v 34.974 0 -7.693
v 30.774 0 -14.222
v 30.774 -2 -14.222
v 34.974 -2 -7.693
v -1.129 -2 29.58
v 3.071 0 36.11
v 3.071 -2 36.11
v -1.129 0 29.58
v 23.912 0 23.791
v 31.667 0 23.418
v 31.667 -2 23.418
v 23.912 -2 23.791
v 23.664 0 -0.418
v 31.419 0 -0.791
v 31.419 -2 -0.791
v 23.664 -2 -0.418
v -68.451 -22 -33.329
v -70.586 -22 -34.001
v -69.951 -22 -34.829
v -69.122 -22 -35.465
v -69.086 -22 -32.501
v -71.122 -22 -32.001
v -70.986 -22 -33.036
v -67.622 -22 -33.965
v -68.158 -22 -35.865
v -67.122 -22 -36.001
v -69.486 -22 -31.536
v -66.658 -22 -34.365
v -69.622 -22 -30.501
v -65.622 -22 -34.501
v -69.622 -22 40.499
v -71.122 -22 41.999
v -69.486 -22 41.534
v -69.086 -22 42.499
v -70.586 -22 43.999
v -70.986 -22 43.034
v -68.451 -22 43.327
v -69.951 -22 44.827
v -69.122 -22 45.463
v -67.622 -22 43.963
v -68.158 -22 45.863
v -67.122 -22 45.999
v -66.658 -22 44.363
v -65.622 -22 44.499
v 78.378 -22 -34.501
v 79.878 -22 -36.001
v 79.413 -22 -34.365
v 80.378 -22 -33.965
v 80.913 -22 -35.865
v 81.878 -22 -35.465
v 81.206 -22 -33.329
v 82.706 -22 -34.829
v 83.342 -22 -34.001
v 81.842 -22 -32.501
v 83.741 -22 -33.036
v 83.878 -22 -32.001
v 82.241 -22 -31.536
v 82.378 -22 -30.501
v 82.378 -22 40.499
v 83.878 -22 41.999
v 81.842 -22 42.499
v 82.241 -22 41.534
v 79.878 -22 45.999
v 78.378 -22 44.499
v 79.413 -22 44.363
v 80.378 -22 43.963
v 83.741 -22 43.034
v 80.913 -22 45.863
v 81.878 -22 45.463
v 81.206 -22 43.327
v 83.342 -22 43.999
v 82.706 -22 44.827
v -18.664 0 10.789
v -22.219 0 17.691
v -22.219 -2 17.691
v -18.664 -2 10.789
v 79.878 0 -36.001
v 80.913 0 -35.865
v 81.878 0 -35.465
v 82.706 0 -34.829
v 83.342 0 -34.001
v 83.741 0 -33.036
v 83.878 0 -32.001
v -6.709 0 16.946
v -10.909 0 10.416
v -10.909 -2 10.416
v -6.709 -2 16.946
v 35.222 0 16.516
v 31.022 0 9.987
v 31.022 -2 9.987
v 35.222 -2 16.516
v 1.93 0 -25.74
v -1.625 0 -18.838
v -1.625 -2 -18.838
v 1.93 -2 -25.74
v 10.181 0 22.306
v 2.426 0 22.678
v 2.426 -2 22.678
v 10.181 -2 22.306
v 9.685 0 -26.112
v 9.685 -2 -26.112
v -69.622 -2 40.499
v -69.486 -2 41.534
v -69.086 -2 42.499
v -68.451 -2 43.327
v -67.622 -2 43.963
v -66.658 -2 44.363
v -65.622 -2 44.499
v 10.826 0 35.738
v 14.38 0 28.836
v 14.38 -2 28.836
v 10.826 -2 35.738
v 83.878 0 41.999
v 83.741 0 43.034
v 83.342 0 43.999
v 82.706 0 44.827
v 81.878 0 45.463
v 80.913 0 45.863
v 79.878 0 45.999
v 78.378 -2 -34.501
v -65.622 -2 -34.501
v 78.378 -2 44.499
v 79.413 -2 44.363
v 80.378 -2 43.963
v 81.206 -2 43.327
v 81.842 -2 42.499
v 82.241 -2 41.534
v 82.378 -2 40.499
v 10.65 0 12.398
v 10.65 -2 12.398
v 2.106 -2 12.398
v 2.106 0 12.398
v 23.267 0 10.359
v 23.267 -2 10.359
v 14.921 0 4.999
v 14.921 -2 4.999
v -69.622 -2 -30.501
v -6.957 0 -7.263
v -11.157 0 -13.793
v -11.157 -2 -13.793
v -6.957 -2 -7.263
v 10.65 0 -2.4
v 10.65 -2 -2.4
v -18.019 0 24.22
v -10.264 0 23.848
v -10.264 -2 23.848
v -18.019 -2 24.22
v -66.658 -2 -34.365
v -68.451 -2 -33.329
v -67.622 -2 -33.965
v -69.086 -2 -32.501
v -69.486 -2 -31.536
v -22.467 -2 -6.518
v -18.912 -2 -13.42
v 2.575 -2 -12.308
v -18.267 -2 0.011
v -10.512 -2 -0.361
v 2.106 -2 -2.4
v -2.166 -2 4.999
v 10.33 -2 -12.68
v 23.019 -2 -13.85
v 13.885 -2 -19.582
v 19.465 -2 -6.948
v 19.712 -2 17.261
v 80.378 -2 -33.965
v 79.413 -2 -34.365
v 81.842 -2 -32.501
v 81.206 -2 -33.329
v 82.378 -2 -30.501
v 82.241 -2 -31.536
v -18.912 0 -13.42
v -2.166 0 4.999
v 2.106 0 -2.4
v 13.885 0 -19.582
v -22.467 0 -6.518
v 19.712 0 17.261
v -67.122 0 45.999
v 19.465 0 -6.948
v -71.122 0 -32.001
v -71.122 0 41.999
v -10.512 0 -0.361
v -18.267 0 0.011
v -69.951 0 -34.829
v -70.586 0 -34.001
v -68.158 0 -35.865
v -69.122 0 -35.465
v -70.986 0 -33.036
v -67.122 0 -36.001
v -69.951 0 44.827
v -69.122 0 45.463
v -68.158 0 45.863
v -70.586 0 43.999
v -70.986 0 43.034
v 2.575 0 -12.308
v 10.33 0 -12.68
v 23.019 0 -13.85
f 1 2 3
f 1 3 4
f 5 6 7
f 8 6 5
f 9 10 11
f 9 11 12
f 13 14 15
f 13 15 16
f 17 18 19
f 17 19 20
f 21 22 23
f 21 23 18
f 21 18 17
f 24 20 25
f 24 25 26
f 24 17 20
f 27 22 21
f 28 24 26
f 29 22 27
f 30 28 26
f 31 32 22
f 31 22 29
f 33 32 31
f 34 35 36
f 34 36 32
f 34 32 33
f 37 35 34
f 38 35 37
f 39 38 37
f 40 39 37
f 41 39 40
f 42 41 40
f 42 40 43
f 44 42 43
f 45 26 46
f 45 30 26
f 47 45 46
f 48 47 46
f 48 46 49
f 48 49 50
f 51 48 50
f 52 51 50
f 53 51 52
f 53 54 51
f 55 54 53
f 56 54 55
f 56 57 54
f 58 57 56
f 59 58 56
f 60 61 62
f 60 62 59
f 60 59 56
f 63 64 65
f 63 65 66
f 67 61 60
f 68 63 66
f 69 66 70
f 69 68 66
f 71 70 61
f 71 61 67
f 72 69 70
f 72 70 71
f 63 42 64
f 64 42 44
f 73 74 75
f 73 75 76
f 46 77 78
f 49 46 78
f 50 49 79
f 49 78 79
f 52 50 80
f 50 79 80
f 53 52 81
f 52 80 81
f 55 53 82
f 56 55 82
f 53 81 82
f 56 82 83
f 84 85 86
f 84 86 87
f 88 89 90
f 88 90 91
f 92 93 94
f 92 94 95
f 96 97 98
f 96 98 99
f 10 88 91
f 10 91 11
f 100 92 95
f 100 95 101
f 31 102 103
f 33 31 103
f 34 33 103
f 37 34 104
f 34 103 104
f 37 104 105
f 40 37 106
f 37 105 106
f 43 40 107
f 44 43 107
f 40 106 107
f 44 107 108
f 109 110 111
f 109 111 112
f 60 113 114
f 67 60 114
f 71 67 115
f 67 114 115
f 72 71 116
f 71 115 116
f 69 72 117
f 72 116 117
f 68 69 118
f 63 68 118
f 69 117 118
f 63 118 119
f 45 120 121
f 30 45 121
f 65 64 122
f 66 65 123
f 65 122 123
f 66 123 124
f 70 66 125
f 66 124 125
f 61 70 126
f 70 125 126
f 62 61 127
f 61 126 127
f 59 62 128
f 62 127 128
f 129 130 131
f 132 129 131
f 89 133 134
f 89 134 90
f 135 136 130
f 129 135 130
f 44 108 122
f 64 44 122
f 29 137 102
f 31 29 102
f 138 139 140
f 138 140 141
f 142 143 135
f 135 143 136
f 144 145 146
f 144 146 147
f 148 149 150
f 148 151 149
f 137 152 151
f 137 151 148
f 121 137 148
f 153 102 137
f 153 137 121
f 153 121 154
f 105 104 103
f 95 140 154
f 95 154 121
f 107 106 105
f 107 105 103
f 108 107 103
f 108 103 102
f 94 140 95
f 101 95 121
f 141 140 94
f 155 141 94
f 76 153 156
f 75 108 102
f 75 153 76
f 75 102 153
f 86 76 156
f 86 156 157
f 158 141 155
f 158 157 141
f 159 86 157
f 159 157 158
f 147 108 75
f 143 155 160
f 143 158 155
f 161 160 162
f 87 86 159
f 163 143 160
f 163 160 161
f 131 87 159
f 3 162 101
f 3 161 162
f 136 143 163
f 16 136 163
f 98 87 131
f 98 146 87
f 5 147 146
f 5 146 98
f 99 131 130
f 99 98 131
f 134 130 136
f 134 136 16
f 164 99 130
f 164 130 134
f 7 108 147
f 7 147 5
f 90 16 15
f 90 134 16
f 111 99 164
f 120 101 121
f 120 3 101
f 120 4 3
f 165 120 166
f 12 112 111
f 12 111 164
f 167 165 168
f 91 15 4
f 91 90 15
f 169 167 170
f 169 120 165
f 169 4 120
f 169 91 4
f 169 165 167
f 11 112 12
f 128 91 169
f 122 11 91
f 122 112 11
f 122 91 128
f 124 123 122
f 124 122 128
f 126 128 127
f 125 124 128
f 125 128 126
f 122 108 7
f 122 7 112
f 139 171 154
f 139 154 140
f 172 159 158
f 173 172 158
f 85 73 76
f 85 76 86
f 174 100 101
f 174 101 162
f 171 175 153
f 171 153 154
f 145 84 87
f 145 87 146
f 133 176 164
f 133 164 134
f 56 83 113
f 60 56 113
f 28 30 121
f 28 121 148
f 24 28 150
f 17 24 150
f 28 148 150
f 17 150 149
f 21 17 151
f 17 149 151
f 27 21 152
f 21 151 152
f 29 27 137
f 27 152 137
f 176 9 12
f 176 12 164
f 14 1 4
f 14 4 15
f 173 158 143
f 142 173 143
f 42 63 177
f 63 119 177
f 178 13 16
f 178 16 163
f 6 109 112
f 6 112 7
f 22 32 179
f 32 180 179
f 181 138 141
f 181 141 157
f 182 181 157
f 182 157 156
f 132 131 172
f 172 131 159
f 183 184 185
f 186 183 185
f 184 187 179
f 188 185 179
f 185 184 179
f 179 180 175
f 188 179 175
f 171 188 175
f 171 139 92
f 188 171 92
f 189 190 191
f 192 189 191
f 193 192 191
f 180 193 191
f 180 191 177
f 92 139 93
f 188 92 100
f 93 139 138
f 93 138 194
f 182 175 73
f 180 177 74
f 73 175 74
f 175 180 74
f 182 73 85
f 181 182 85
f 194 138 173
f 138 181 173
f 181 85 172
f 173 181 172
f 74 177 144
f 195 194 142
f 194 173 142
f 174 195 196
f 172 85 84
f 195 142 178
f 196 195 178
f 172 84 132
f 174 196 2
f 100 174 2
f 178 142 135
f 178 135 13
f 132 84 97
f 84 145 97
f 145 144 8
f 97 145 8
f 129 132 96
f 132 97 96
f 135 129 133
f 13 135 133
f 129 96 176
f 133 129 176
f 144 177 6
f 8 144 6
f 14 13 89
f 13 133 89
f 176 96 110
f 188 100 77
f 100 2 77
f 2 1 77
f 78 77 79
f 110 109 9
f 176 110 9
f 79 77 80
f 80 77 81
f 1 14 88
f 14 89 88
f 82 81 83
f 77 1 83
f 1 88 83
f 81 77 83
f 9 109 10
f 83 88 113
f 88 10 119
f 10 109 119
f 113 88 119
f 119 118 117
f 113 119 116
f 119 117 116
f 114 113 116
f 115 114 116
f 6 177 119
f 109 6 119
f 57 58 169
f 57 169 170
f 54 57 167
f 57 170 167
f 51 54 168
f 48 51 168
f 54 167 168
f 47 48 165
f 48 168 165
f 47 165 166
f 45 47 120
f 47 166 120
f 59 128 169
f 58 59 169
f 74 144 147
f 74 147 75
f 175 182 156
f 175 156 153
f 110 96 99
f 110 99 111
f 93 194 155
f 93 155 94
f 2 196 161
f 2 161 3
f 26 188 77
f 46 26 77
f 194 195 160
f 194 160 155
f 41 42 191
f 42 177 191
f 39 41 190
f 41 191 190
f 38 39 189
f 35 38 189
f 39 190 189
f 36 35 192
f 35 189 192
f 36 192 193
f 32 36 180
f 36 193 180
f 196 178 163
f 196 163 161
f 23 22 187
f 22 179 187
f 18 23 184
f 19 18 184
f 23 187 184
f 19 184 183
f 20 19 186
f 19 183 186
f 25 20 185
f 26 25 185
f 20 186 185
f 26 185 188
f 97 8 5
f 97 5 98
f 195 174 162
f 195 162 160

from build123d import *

# Parameters (mm, degrees)
F1_DEPTH = 2
F3_DEPTH = 20
F5_DEPTH = 12.5


# Not quite as in the source:
# - a feature names something its author has since deleted; it is built from what else it names


with BuildPart() as f1:
    # F0 (on Front) → F1 (new body)
    with BuildSketch(Plane.XZ):
        with BuildLine():
            Line((79.8777135909, 45.9989449601), (-67.1222864091, 45.9989449601))
            ThreePointArc((-67.1222864091, 45.9989449601), (-69.9507135339, 44.8273720848), (-71.1222864091, 41.9989449601))
            Line((-71.1222864091, 41.9989449601), (-71.1222864091, -32.0010550399))
            ThreePointArc((-71.1222864091, -32.0010550399), (-69.9507135339, -34.8294821647), (-67.1222864091, -36.0010550399))
            Line((-67.1222864091, -36.0010550399), (79.8777135909, -36.0010550399))
            ThreePointArc((79.8777135909, -36.0010550399), (82.7061407156, -34.8294821647), (83.8777135909, -32.0010550399))
            Line((83.8777135909, -32.0010550399), (83.8777135909, 41.9989449601))
            ThreePointArc((83.8777135909, 41.9989449601), (82.7061407156, 44.8273720848), (79.8777135909, 45.9989449601))
        make_face()
    extrude(amount=F1_DEPTH)

    # F2 (on face) → F3 (join)
    with BuildSketch(Plane.XZ.offset(2)):
        with BuildLine():
            ThreePointArc((83.8777135909, 41.9989449601), (82.7061407156, 44.8273720848), (79.8777135909, 45.9989449601))
            Line((79.8777135909, 45.9989449601), (-67.1222864091, 45.9989449601))
            ThreePointArc((-67.1222864091, 45.9989449601), (-69.9507135339, 44.8273720848), (-71.1222864091, 41.9989449601))
            Line((-71.1222864091, 41.9989449601), (-71.1222864091, -32.0010550399))
            ThreePointArc((-71.1222864091, -32.0010550399), (-69.9507135339, -34.8294821647), (-67.1222864091, -36.0010550399))
            Line((-67.1222864091, -36.0010550399), (79.8777135909, -36.0010550399))
            ThreePointArc((79.8777135909, -36.0010550399), (82.7061407156, -34.8294821647), (83.8777135909, -32.0010550399))
            Line((83.8777135909, -32.0010550399), (83.8777135909, 41.9989449601))
        make_face()
        with BuildLine():
            ThreePointArc((-69.6222864091, 40.4989449601), (-68.4507135339, 43.3273720848), (-65.6222864091, 44.4989449601))
            Line((-65.6222864091, 44.4989449601), (78.3777135909, 44.4989449601))
            ThreePointArc((78.3777135909, 44.4989449601), (81.2061407156, 43.3273720848), (82.3777135909, 40.4989449601))
            Line((82.3777135909, 40.4989449601), (82.3777135909, -30.5010550399))
            ThreePointArc((82.3777135909, -30.5010550399), (81.2061407156, -33.3294821647), (78.3777135909, -34.5010550399))
            Line((78.3777135909, -34.5010550399), (-65.6222864091, -34.5010550399))
            ThreePointArc((-65.6222864091, -34.5010550399), (-68.4507135339, -33.3294821647), (-69.6222864091, -30.5010550399))
            Line((-69.6222864091, -30.5010550399), (-69.6222864091, 40.4989449601))
        make_face(mode=Mode.SUBTRACT)
    extrude(amount=F3_DEPTH)

    # F4 (on face) → F5 (cut, symmetric)
    with BuildSketch(Plane.XZ.offset(2)):
        Polygon((14.3804825891, 28.8355327559), (10.8255747657, 35.7375912952), (3.0707628205, 36.1099800817), (-1.1291413013, 29.5803103289), (2.4257665221, 22.6782517895), (10.1805784673, 22.305863003), align=None)
        Polygon((35.2220927825, 16.5163073577), (31.6671849591, 23.4183658971), (23.9123730139, 23.7907546836), (19.7124688921, 17.2610849307), (23.2673767155, 10.3590263914), (31.0221886607, 9.9866376049), align=None)
        Polygon((30.7742316076, -14.2223389774), (34.9741357295, -7.6926692246), (31.419227906, -0.7906106852), (23.6644159608, -0.4182218987), (19.464511839, -6.9478916516), (23.0194196624, -13.8499501909), align=None)
        Polygon((1.929852416, -25.7397013751), (9.6846643612, -26.1120901616), (13.884568483, -19.5824204088), (10.3296606596, -12.6803618694), (2.5748487144, -12.3079730829), (-1.6250554074, -18.8376428357), align=None)
        Polygon((-22.4666656008, -6.5184174376), (-18.9117577774, -13.420475977), (-11.1569458322, -13.7928647635), (-6.9570417103, -7.2631950106), (-10.5119495338, -0.3611364712), (-18.266761479, 0.0112523153), align=None)
        Polygon((-18.0188044259, 24.2202288976), (-22.2187085477, 17.6905591447), (-18.6638007243, 10.7885006053), (-10.9089887791, 10.4161118188), (-6.7090846573, 16.9457815717), (-10.2639924807, 23.8478401111), align=None)
        Polygon((2.1058970544, -2.4000583217), (10.6495301273, -2.4000583217), (14.9213466637, 4.9989449601), (10.6495301273, 12.3979482418), (2.1058970544, 12.3979482418), (-2.165919482, 4.9989449601), align=None)
    extrude(amount=F5_DEPTH, both=True, mode=Mode.SUBTRACT)


solid = f1.part
